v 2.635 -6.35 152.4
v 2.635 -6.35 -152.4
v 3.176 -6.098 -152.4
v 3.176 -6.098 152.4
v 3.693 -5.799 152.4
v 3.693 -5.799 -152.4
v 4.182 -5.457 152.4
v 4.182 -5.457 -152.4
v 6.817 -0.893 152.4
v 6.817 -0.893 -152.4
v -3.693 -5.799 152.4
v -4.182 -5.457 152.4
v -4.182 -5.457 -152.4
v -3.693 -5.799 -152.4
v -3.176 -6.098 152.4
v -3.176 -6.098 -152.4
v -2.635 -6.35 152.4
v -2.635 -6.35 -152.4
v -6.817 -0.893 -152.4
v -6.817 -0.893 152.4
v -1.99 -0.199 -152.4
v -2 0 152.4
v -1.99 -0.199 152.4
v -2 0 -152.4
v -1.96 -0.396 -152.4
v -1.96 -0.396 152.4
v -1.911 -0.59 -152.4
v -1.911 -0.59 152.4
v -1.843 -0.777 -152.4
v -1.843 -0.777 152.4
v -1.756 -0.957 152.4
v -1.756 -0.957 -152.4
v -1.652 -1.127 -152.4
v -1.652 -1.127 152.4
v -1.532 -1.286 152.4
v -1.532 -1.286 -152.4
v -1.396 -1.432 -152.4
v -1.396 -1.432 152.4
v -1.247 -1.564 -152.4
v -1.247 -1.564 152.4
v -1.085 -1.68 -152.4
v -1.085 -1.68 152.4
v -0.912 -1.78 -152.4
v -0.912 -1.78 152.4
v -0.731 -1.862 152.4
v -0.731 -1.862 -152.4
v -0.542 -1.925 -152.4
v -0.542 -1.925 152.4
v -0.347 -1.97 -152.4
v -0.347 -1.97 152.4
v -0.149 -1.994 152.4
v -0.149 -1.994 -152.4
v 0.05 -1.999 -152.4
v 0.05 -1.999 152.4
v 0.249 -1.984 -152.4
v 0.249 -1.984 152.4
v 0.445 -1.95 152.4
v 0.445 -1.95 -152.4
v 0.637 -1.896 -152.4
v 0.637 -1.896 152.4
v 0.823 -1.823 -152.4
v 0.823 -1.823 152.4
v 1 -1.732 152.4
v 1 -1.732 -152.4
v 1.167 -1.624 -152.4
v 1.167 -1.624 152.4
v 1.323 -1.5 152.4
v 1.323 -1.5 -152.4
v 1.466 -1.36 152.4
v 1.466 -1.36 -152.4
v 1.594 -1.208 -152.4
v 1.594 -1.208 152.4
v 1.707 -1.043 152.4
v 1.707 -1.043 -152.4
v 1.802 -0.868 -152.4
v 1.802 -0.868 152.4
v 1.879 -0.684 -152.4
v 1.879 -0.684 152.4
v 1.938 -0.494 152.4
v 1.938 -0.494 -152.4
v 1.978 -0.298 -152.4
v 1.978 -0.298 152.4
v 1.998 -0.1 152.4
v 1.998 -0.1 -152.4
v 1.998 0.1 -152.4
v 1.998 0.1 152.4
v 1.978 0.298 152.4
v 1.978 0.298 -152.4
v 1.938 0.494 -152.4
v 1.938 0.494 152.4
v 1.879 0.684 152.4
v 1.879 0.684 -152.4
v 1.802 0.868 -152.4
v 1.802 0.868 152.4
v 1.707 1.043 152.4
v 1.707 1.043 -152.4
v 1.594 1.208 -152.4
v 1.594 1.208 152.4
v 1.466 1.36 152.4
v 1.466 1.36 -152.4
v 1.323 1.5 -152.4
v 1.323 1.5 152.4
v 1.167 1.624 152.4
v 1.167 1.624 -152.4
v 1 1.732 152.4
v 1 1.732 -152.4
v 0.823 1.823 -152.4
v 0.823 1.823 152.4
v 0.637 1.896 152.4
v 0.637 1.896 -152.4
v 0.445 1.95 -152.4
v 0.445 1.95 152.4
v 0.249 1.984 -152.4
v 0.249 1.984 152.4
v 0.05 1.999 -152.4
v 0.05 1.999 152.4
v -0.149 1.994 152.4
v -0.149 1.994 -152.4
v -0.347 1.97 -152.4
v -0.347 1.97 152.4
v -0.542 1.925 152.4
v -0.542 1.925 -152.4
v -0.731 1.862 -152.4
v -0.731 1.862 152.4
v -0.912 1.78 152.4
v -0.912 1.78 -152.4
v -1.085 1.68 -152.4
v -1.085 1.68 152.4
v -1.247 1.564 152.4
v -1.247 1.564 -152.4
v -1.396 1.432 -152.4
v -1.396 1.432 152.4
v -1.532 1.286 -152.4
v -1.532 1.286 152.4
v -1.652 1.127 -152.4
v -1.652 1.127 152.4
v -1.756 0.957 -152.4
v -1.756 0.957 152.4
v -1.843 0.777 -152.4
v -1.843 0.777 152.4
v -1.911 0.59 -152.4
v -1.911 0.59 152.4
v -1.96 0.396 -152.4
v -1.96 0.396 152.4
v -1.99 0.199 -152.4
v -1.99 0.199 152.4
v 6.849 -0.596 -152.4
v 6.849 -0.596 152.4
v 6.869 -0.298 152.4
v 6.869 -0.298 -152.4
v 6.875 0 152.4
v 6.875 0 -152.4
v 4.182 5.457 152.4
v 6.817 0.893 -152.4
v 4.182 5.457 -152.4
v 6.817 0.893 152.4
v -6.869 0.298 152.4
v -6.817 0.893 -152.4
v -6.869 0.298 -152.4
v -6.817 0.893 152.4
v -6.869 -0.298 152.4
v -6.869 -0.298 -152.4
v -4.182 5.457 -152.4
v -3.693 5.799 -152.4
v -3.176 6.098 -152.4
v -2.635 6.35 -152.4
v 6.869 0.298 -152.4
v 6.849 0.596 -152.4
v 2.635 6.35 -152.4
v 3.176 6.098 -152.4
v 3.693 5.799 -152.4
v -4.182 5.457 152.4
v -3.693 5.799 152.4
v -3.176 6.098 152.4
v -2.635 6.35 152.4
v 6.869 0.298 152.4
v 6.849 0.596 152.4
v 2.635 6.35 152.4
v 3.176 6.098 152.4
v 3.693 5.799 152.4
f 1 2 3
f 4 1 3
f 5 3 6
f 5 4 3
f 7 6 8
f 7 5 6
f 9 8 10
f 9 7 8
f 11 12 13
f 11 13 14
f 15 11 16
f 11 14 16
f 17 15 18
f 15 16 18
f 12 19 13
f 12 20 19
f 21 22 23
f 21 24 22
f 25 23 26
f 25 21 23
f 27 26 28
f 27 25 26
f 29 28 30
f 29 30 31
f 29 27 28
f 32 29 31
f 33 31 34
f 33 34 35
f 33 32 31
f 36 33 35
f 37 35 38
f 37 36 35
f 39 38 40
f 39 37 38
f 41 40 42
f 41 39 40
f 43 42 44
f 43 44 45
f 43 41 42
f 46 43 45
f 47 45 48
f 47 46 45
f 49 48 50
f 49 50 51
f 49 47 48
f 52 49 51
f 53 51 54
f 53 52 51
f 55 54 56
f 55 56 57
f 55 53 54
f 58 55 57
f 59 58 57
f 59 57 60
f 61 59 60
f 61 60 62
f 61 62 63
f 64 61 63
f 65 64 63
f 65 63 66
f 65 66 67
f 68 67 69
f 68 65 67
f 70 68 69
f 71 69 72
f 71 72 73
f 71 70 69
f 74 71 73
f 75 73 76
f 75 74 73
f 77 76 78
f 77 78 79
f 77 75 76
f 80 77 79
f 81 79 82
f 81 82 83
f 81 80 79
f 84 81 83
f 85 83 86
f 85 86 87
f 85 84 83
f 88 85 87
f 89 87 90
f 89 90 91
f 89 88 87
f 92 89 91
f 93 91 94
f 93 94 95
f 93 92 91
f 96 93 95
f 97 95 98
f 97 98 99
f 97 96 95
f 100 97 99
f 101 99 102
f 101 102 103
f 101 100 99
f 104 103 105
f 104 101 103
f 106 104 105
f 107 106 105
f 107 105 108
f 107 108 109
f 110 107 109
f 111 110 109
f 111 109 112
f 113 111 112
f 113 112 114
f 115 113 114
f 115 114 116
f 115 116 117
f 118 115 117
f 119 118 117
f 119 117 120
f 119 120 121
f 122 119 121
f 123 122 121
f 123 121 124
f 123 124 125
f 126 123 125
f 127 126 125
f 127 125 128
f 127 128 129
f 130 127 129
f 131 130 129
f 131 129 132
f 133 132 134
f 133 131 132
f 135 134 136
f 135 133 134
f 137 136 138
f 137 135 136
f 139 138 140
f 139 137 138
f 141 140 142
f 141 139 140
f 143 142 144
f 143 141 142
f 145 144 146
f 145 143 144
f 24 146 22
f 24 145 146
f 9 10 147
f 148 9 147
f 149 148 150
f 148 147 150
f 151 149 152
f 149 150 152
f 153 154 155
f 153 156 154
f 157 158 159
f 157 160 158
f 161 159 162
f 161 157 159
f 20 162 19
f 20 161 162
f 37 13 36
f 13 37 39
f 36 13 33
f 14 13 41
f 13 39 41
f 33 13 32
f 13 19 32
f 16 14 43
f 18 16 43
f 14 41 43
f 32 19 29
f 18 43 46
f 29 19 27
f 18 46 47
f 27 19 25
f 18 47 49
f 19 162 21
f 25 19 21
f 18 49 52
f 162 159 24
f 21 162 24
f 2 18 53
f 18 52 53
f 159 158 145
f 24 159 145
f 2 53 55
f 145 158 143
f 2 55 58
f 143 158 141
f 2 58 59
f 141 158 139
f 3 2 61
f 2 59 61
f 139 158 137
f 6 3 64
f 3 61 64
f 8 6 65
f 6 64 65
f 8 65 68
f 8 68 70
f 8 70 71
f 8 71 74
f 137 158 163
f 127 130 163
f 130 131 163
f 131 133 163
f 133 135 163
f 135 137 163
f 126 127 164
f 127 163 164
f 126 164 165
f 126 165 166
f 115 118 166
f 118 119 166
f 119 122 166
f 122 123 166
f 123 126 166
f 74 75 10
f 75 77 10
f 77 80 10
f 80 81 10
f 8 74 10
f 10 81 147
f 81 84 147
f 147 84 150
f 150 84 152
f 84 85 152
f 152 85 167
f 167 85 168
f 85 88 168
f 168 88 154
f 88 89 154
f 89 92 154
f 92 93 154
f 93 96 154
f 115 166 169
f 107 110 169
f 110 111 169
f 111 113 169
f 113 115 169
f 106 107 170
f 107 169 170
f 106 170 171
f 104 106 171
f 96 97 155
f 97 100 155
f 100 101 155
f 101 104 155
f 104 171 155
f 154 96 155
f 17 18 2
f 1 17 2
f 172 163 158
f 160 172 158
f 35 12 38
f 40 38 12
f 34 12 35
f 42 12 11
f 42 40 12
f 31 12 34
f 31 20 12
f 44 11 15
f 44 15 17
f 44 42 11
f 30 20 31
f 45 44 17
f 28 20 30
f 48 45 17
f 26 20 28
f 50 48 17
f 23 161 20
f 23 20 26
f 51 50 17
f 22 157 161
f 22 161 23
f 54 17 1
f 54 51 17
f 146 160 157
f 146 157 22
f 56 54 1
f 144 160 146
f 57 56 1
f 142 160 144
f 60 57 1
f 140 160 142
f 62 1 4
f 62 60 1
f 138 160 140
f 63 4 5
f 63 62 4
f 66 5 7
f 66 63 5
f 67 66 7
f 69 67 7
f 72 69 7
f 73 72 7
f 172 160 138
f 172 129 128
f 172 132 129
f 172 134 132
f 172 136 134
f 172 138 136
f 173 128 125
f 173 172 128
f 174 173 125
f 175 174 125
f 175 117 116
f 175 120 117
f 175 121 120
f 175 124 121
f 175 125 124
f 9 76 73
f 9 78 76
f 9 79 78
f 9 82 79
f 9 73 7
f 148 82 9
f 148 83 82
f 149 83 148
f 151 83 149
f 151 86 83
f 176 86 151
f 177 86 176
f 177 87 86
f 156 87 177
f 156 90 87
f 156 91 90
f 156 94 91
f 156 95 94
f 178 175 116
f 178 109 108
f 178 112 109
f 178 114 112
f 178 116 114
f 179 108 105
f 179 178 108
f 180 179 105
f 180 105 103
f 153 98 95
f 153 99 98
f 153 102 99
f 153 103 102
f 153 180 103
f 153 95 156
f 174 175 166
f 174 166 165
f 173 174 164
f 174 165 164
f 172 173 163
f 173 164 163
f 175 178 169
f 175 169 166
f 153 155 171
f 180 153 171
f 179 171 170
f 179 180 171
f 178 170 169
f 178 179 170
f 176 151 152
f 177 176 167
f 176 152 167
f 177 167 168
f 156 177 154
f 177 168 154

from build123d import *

# Parameters (mm, degrees)
SKETCH1_R           = 2.000000064
BOSS_EXTRUDE1_DEPTH = 152.4


with BuildPart() as part:
    # Sketch1 → Boss-Extrude1 (new, symmetric)
    with BuildSketch(Plane.XY):
        with BuildLine():
            ThreePointArc((4.181770846, 5.456960429), (3.437499983, 5.953924622), (2.634980936, 6.35))
            Line((2.634980936, 6.35), (-2.634980936, 6.35))
            ThreePointArc((-2.634980936, 6.35), (-3.437499983, 5.953924622), (-4.181770846, 5.456960429))
            Line((-4.181770846, 5.456960429), (-6.816751782, 0.893039571))
            ThreePointArc((-6.816751782, 0.893039571), (-6.874999966, 0), (-6.816751782, -0.893039571))
            Line((-6.816751782, -0.893039571), (-4.181770846, -5.456960429))
            ThreePointArc((-4.181770846, -5.456960429), (-3.437499983, -5.953924622), (-2.634980936, -6.35))
            Line((-2.634980936, -6.35), (2.634980936, -6.35))
            ThreePointArc((2.634980936, -6.35), (3.437499983, -5.953924622), (4.181770846, -5.456960429))
            Line((4.181770846, -5.456960429), (6.816751782, -0.893039571))
            ThreePointArc((6.816751782, -0.893039571), (6.860422465, -0.447468582), (6.874999966, 0))
            ThreePointArc((6.874999966, 0), (6.860422465, 0.447468582), (6.816751782, 0.893039571))
            Line((6.816751782, 0.893039571), (4.181770846, 5.456960429))
        make_face()
        with Locations(Location((0, 0, 0), (0, 0, 180))):
            Circle(SKETCH1_R, mode=Mode.SUBTRACT)
    extrude(amount=BOSS_EXTRUDE1_DEPTH, both=True)


solid = part.part
